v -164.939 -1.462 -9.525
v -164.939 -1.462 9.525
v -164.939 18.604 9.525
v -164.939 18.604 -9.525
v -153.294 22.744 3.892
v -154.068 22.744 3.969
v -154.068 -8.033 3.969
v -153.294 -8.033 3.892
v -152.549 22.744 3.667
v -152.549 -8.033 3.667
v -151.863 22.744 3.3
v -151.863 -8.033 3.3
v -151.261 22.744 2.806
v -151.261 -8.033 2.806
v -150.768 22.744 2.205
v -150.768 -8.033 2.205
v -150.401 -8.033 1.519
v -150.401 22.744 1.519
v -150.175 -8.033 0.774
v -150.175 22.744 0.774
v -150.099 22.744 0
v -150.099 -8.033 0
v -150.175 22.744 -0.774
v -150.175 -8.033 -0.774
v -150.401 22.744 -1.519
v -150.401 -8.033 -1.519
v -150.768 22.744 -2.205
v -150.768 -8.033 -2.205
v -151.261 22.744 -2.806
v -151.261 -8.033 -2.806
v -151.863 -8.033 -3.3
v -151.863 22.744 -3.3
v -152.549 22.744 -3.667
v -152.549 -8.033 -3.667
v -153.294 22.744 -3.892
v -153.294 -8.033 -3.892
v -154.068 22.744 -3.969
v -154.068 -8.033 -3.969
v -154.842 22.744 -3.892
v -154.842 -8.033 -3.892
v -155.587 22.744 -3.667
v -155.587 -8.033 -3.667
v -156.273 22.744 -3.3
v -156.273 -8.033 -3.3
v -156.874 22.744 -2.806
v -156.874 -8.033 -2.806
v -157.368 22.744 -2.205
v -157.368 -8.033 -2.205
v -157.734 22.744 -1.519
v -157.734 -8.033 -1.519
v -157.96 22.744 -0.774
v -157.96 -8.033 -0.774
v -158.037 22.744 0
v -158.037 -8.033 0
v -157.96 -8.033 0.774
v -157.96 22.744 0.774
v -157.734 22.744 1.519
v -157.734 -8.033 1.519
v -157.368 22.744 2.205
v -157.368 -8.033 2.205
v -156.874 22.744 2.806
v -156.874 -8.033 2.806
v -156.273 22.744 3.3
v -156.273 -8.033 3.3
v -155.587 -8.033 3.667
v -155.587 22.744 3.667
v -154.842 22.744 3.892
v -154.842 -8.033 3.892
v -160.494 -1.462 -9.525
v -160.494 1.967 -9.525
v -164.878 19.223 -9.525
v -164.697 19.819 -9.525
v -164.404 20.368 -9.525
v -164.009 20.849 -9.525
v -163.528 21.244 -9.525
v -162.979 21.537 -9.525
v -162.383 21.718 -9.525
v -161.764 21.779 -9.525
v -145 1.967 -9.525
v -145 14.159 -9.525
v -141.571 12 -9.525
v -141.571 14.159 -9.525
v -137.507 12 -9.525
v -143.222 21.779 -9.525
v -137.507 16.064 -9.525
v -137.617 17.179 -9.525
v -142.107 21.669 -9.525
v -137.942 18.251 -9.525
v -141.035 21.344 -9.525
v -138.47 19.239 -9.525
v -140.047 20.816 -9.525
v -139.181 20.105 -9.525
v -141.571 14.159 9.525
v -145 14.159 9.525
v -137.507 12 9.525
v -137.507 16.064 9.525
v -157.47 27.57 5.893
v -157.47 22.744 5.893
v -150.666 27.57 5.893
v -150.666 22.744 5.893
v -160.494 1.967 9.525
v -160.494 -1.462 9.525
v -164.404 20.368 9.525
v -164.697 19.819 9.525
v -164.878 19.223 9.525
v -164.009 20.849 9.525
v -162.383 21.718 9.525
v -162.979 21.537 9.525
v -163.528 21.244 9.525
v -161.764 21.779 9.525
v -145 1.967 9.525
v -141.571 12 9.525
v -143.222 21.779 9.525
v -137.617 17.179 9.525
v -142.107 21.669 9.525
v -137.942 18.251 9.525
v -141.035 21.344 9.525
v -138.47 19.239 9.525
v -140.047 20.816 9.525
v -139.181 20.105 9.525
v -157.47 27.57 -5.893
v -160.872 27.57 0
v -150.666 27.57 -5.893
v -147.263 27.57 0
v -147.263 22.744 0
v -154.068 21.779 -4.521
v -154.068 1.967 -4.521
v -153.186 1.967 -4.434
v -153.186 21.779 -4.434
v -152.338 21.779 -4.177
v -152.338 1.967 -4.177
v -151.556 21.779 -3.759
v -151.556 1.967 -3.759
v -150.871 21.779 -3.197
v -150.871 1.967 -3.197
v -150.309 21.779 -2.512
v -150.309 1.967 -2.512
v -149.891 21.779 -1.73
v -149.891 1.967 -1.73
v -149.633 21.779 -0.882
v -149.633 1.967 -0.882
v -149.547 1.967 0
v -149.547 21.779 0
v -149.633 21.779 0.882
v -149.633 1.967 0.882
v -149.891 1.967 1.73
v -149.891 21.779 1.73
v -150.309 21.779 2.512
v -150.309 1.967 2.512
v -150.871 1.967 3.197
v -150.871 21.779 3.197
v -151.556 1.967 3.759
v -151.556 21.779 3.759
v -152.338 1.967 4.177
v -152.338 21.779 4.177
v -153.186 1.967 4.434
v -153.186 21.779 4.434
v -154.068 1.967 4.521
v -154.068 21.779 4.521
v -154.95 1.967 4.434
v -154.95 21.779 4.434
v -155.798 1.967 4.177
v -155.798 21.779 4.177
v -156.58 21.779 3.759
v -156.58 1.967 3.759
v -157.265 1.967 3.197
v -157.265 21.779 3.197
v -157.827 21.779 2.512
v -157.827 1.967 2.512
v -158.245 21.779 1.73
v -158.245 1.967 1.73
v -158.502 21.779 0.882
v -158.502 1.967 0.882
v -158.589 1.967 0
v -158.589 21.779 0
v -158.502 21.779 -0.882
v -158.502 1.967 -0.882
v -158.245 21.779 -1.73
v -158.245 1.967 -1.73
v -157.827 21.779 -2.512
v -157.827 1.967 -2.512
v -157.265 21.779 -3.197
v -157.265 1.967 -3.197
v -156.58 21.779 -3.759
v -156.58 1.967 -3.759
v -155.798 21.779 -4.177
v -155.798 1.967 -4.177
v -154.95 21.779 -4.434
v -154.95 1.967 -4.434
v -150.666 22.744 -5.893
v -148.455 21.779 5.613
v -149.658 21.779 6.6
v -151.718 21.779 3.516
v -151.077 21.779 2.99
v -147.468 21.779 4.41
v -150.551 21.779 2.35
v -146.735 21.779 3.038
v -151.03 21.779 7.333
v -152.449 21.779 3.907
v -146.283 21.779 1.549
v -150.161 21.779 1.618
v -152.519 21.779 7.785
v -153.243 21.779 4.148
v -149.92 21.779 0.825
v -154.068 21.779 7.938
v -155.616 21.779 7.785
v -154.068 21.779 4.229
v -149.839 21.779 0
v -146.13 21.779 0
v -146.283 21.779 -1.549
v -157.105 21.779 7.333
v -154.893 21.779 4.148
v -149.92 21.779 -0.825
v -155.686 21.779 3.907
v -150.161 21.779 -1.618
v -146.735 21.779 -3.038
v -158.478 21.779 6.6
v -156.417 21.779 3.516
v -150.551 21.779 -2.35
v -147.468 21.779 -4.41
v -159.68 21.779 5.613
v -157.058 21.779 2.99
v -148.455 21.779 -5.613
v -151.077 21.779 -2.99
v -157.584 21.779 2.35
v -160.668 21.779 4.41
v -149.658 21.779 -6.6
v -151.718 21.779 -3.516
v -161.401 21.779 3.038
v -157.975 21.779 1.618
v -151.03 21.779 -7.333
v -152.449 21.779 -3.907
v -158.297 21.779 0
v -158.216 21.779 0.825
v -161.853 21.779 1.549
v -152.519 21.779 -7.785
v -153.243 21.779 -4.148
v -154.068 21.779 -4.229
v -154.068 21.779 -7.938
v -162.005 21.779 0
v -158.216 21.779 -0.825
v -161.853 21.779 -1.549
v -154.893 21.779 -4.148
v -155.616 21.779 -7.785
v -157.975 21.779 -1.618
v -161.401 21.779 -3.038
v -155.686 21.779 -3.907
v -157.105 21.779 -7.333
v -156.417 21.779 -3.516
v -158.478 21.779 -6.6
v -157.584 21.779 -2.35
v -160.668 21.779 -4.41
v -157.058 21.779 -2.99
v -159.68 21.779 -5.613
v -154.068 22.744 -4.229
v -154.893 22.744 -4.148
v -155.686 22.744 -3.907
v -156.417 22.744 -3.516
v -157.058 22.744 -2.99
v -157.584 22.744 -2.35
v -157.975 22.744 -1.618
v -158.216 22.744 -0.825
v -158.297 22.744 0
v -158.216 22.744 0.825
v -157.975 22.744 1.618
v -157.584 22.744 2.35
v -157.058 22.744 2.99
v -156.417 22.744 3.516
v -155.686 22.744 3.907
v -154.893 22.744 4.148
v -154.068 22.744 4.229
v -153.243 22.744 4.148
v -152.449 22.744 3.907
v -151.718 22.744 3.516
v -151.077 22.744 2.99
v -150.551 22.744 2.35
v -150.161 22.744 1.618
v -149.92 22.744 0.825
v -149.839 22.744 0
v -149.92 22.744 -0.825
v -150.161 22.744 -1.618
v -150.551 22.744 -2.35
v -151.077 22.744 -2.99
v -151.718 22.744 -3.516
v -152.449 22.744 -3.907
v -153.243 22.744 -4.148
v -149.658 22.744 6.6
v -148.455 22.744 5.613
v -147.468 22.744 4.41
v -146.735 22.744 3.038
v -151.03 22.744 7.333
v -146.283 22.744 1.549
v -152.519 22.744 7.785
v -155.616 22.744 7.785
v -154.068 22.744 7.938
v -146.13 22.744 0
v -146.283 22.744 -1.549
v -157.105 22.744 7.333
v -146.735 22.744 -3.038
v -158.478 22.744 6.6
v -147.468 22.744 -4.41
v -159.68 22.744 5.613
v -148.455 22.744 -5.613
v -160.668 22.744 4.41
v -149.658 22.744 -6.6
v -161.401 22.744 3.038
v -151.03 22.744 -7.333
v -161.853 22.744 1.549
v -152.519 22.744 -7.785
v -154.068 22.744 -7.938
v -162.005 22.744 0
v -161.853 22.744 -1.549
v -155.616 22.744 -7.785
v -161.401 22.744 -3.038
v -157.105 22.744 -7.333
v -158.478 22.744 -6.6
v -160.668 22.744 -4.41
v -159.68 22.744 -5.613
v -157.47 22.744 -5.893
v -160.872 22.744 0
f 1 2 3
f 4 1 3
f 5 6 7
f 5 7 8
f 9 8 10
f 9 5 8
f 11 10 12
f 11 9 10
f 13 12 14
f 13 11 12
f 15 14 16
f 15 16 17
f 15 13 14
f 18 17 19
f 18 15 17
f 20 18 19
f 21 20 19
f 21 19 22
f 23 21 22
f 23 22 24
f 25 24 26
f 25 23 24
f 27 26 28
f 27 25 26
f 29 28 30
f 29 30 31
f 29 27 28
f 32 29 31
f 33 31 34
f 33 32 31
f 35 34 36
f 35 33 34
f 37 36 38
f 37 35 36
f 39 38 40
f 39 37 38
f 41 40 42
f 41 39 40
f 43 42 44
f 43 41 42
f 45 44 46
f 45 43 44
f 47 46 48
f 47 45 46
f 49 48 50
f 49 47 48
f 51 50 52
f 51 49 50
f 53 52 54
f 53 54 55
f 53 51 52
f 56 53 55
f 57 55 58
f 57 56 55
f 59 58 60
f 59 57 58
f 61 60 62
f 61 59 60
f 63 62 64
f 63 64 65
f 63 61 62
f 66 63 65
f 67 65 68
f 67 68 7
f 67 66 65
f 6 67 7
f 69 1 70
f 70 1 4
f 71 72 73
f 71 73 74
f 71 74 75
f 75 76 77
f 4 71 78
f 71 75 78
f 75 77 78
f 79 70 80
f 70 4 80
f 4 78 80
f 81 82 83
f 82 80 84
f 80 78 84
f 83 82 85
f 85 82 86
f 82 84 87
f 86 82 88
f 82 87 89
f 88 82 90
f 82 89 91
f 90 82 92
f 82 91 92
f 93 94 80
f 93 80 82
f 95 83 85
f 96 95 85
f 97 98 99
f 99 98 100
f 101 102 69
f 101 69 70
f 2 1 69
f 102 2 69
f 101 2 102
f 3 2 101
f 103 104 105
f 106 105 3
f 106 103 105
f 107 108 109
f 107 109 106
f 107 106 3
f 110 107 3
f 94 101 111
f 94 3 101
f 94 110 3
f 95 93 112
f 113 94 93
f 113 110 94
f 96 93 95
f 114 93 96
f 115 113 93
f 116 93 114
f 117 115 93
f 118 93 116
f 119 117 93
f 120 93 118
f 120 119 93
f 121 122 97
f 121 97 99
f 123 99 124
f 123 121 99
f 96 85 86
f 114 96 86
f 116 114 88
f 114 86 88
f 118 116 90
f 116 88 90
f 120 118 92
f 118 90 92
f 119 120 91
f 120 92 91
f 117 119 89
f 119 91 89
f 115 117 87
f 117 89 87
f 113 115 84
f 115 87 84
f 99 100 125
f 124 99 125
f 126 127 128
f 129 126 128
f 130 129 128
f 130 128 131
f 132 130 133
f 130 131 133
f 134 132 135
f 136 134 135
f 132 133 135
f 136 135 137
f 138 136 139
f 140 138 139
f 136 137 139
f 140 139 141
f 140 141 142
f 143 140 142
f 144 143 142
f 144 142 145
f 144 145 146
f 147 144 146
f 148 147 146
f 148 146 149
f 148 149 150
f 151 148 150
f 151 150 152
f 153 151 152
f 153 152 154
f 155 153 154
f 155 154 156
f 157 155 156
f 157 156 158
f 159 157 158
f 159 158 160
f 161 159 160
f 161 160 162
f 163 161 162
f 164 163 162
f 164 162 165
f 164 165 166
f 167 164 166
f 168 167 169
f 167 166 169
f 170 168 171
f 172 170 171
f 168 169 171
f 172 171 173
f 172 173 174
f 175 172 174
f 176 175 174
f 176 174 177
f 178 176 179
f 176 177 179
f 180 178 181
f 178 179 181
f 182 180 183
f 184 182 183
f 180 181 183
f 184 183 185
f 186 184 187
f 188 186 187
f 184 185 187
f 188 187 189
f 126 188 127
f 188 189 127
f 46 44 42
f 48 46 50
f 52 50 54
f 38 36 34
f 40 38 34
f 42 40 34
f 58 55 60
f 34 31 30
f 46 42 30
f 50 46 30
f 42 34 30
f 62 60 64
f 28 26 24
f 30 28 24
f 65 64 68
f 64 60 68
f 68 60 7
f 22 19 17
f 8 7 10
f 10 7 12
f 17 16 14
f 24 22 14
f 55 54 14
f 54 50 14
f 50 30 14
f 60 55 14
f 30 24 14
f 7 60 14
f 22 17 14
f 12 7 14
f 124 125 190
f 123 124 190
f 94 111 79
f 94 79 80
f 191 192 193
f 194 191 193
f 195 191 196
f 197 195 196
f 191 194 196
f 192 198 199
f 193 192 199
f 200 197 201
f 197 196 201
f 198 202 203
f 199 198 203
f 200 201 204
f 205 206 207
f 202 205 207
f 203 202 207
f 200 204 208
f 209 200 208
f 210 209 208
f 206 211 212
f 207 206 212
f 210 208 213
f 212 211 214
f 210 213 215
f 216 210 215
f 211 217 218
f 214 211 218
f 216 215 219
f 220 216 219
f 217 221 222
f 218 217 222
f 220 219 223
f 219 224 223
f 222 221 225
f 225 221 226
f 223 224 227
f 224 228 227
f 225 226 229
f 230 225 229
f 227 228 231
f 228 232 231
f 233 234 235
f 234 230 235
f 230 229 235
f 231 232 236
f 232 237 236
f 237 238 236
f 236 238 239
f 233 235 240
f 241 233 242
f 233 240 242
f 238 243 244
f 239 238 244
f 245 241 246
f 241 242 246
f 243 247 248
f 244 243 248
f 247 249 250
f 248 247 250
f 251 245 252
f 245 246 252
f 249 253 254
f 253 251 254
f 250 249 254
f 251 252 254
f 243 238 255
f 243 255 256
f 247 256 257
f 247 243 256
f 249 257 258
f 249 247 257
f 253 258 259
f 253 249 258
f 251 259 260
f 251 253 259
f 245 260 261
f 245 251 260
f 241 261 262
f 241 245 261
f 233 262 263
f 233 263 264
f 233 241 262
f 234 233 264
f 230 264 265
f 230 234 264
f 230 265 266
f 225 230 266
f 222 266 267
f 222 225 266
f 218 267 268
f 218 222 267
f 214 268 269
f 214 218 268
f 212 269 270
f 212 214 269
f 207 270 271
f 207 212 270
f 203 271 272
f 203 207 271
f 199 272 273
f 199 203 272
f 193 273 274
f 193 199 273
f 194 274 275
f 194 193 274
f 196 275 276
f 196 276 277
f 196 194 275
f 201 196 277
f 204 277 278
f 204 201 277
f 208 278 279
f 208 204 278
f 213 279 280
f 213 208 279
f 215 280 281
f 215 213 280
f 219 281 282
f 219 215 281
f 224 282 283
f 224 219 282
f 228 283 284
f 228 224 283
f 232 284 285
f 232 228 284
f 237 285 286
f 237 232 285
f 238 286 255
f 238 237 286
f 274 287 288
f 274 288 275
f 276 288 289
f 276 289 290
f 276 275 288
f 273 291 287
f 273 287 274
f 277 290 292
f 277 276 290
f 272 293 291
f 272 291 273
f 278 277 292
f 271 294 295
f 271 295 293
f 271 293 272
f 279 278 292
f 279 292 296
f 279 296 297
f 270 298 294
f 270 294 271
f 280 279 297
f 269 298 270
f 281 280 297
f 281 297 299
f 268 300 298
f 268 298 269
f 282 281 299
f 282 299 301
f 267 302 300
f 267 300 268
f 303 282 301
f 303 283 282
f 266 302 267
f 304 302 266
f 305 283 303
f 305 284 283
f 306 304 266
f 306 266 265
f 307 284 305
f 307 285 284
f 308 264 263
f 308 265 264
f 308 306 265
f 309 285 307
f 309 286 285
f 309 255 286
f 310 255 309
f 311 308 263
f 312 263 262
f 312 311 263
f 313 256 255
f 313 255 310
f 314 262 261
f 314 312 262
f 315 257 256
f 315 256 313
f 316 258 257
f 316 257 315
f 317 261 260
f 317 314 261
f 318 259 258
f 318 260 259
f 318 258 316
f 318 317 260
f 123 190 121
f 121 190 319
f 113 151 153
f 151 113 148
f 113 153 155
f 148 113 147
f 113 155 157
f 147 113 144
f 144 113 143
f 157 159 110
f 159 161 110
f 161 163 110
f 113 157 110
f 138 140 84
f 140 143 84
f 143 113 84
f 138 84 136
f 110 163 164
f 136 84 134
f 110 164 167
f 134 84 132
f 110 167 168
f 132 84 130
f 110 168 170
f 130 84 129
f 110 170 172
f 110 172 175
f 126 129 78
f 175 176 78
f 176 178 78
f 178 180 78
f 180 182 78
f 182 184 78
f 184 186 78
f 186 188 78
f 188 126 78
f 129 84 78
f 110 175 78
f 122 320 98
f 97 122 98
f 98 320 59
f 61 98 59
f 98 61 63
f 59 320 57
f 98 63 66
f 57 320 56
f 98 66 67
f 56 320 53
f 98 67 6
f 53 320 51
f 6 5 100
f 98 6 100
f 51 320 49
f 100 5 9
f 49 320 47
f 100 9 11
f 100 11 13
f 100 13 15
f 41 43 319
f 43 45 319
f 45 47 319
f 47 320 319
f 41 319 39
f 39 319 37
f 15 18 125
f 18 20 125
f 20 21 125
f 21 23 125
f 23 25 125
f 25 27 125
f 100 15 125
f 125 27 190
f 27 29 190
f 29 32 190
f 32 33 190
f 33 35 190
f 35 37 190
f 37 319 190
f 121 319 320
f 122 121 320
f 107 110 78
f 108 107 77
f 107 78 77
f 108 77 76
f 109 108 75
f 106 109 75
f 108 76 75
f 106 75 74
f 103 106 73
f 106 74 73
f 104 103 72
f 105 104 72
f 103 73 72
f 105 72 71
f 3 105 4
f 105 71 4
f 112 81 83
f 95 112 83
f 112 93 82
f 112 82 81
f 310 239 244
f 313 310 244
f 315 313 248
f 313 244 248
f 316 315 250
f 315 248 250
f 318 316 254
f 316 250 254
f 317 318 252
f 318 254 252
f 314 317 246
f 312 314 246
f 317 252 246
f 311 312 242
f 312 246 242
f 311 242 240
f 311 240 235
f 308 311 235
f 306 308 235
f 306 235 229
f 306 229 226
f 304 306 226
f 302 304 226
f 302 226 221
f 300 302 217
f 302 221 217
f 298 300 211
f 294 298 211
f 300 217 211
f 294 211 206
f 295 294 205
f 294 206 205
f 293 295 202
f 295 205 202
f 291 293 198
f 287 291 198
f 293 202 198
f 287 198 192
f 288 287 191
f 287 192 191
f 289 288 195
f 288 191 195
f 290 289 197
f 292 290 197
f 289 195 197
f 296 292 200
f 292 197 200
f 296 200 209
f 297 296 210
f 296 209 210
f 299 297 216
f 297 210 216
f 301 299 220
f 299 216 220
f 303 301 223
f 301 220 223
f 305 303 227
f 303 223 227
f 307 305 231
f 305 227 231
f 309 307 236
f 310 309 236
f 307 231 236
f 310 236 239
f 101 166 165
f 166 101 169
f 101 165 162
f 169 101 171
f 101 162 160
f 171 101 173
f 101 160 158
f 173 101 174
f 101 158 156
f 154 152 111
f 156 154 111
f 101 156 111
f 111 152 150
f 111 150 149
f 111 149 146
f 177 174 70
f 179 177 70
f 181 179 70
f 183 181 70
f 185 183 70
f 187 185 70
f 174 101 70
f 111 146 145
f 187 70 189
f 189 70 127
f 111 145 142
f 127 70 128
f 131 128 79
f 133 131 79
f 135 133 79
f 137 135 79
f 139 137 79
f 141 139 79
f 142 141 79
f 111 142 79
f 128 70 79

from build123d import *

# Parameters (mm, degrees)
BOSS_EXTRUDE1_DEPTH      = 9.525
BOSS_EXTRUDE1_DEPTH_BACK = 9.525
SKETCH2_W                = 4.445
SKETCH2_H                = 3.429
BOSS_EXTRUDE2_DEPTH      = 19.05
SKETCH3_R                = 4.5212
CUT_EXTRUDE1_DEPTH       = 167.397459987
SKETCH7_R                = 7.9375
SKETCH7_R_2              = 4.2291
BOSS_EXTRUDE3_DEPTH      = 0.9652
SKETCH8_R                = 3.96875
BOSS_EXTRUDE4_DEPTH      = 30.777
BOSS_EXTRUDE5_DEPTH      = 4.826


with BuildPart() as part:
    # Sketch1 → Boss-Extrude1 (new, two sides: drawn at the far end of the back side and taken through both)
    with BuildSketch(Plane.XY.offset(-BOSS_EXTRUDE1_DEPTH_BACK)):
        with BuildLine():
            Line((-164.939, 1.96699994), (-145, 1.96699994))
            Line((-145, 1.96699994), (-145, 14.15899994))
            Line((-145, 14.15899994), (-141.571, 14.15899994))
            Line((-141.571, 14.15899994), (-141.571, 11.99999994))
            Line((-141.571, 11.99999994), (-137.507, 11.99999994))
            Line((-137.507, 11.99999994), (-137.507, 16.06399994))
            ThreePointArc((-137.507, 16.06399994), (-139.180884746, 20.105115194), (-143.222, 21.77899994))
            Line((-143.222, 21.77899994), (-161.764, 21.77899994))
            ThreePointArc((-161.764, 21.77899994), (-164.00906403, 20.84906397), (-164.939, 18.60399994))
            Line((-164.939, 18.60399994), (-164.939, 1.96699994))
        make_face()
    extrude(amount=BOSS_EXTRUDE1_DEPTH + BOSS_EXTRUDE1_DEPTH_BACK)

    # Sketch2 → Boss-Extrude2 (add)
    with BuildSketch(Plane.XY.offset(9.525)):
        with Locations((-162.7165, 0.25249994)):
            Rectangle(SKETCH2_W, SKETCH2_H)
    extrude(amount=-BOSS_EXTRUDE2_DEPTH)

    # Sketch3 → Cut-Extrude1 (cut, through all)
    with BuildSketch(Plane.XZ.offset(-1.96699994)):
        with Locations(Location((-154.0678, 0, 0), (0, 0, 270))):
            Circle(SKETCH3_R)
    extrude(amount=-CUT_EXTRUDE1_DEPTH, mode=Mode.SUBTRACT)


with BuildPart() as body_2:
    # Sketch7 → Boss-Extrude3 (new body)
    with BuildSketch(Plane(origin=(0, 21.77899994, 0), x_dir=(1, 0, 0), z_dir=(0, 1, 0))):
        with Locations(Location((-154.0678, 0, 0), (0, 0, 90))):
            Circle(SKETCH7_R)
        with Locations(Location((-154.0678, 0, 0), (0, 0, 90))):
            Circle(SKETCH7_R_2, mode=Mode.SUBTRACT)
    extrude(amount=BOSS_EXTRUDE3_DEPTH)


with BuildPart() as body_3:
    # Sketch8 → Boss-Extrude4 (new body)
    with BuildSketch(Plane(origin=(0, 22.74419994, 0), x_dir=(1, 0, 0), z_dir=(0, 1, 0))):
        with Locations(Location((-154.0678, 0, 0), (0, 0, 270))):
            Circle(SKETCH8_R)
    extrude(amount=-BOSS_EXTRUDE4_DEPTH)


with BuildPart() as body_4:
    # Sketch9 → Boss-Extrude5 (new body)
    with BuildSketch(Plane(origin=(0, 22.74419994, 0), x_dir=(1, 0, 0), z_dir=(0, 1, 0))):
        Polygon((-150.665590334, 5.8928), (-157.470009666, 5.8928), (-160.872219333, 0), (-157.470009666, -5.8928), (-150.665590334, -5.8928), (-147.263380667, 0), align=None)
    extrude(amount=BOSS_EXTRUDE5_DEPTH)

    # Combine1: union body 3
    add(body_3.part)


solid = Compound([part.part, body_2.part, body_4.part])
